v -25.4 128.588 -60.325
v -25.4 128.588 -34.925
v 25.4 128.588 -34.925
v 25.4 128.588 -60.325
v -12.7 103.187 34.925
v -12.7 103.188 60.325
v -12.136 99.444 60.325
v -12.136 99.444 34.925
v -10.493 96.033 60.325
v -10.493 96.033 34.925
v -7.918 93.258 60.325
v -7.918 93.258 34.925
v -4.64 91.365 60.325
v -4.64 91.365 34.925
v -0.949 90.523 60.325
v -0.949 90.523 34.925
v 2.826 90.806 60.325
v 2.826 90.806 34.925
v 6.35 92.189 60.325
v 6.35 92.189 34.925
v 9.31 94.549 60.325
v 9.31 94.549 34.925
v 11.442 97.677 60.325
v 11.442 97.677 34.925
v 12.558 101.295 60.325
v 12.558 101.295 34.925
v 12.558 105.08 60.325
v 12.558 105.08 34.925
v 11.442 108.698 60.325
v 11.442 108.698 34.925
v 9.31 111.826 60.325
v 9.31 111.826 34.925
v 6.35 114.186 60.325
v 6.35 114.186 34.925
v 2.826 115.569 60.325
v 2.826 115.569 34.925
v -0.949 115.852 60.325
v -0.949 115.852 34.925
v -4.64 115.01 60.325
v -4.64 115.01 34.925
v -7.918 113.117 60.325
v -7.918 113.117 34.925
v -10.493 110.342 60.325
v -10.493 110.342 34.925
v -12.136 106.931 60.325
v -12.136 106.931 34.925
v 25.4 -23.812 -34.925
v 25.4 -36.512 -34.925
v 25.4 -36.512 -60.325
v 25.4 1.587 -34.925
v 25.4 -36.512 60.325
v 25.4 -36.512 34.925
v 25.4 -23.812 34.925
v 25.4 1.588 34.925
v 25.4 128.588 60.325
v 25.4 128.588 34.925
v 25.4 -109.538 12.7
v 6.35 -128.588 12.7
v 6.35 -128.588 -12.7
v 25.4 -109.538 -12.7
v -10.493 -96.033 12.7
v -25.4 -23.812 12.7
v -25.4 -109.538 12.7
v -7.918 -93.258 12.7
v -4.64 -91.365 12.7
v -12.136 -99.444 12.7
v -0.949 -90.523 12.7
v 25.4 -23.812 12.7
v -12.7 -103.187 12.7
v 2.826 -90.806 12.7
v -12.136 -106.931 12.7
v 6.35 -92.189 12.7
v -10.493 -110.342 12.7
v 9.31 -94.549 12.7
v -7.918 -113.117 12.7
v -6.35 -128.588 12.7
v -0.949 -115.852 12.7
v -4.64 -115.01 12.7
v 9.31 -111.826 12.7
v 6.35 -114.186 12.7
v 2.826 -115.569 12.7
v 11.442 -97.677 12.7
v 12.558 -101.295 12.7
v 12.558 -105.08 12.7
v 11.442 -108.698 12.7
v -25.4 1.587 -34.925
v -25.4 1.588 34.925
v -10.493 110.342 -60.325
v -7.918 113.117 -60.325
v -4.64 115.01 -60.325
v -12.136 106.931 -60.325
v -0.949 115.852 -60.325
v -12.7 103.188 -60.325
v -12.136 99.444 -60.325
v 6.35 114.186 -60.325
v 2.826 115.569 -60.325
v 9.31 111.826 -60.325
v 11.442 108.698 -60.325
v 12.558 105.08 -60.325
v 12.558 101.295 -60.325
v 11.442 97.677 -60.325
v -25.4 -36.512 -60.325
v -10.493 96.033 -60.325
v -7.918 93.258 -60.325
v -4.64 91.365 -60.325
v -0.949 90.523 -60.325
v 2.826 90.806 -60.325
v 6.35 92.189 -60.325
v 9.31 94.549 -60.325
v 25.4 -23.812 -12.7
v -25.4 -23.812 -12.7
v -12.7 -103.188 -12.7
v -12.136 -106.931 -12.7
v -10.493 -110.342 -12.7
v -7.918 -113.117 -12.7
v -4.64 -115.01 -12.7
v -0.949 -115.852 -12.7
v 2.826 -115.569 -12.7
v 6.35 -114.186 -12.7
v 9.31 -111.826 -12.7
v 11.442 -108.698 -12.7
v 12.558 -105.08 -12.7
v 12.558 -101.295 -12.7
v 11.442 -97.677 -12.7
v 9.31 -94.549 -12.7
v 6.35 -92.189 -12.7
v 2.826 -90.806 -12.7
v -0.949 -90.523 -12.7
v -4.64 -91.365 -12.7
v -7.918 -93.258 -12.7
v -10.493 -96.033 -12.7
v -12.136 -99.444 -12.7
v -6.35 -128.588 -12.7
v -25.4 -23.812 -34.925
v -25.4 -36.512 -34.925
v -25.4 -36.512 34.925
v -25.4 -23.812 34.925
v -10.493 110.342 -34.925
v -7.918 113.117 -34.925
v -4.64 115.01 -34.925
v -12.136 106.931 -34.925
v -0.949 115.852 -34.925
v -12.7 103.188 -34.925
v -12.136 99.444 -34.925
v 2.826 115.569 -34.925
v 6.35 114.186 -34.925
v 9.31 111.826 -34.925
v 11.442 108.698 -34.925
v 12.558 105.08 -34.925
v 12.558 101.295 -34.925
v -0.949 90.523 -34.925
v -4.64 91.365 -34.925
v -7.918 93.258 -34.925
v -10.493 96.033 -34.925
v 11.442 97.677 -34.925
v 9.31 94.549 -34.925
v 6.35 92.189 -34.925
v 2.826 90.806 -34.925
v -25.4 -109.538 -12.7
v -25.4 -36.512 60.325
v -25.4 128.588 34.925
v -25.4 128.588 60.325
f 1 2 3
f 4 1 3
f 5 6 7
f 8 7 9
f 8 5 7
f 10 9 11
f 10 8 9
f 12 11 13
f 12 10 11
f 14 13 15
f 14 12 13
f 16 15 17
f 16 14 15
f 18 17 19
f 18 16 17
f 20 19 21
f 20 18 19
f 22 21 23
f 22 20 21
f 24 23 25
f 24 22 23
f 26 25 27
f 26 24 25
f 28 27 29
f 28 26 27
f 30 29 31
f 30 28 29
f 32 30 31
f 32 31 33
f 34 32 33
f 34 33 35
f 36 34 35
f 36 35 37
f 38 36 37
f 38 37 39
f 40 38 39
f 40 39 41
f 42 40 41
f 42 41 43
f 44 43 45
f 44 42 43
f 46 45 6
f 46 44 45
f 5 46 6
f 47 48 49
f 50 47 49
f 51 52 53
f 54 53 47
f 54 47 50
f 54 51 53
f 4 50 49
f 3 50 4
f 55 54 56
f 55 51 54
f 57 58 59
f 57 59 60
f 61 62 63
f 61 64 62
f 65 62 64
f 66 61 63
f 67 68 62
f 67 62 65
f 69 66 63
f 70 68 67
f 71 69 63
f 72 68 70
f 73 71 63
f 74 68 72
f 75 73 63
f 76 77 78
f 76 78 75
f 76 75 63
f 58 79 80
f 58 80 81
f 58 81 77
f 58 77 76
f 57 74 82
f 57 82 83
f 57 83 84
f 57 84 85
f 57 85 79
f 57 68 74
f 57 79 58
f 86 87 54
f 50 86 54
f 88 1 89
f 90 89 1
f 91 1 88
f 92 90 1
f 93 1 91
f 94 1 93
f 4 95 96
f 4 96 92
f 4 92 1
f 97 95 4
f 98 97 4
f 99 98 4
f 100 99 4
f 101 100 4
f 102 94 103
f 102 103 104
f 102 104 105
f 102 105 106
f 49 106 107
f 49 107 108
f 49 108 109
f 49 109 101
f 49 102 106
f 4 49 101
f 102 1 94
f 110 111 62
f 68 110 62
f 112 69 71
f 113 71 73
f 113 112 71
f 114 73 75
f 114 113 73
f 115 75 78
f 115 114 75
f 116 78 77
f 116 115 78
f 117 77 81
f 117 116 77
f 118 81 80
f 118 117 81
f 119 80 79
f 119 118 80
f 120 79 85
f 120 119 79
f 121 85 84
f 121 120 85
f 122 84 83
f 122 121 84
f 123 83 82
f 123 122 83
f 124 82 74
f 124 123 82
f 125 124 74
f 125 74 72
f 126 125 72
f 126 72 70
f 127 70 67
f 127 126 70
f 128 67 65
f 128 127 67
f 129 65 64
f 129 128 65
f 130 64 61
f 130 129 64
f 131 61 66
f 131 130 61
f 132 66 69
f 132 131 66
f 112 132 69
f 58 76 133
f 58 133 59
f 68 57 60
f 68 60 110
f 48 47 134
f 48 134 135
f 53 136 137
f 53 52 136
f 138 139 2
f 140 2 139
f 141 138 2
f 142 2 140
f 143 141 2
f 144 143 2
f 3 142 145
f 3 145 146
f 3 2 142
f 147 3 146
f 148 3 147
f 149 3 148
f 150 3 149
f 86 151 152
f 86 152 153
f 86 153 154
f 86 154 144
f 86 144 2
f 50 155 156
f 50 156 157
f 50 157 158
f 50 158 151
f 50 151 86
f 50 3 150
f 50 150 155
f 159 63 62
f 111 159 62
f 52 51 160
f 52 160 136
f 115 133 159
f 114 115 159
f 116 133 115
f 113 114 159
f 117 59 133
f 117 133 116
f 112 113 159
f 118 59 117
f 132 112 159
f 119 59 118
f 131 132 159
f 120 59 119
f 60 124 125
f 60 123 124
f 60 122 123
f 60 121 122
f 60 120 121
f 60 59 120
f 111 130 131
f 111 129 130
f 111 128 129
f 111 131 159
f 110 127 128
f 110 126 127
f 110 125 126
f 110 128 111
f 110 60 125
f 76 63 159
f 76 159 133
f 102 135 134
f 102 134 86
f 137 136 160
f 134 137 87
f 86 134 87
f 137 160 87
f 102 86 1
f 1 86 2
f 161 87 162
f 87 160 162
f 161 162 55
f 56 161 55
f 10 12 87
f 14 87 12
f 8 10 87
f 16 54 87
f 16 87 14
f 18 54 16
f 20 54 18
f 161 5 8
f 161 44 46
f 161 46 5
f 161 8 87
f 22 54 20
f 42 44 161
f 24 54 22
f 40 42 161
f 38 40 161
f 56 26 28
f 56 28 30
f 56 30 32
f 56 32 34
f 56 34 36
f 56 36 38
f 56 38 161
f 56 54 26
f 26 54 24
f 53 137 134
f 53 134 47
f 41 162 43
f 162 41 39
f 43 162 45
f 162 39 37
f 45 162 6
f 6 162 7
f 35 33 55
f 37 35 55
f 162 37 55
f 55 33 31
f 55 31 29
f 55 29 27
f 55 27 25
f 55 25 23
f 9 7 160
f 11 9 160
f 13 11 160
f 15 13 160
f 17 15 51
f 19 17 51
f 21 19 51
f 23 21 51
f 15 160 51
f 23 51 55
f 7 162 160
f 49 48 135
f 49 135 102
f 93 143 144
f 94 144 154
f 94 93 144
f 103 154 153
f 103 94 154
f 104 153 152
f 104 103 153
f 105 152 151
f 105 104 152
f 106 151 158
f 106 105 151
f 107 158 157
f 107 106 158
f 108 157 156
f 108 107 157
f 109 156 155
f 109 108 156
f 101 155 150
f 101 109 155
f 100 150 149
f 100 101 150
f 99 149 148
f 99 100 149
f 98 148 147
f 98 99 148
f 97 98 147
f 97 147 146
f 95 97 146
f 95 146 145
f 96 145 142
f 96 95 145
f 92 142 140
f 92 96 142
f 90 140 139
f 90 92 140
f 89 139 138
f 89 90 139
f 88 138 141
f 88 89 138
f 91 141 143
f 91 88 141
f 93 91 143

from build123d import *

# Parameters (mm, degrees)
SKETCH1_W                      = 50.8
SKETCH1_H                      = 257.175
SKETCH1_R                      = 12.7
EXTRUDE1_DEPTH                 = 60.325
CUT_EXTRUDE1_DEPTH             = 179.146927159
CUT_EXTRUDE2_REACH             = 146.288
CUT_EXTRUDE2_DIRECTION_2_REACH = 146.288
SKETCH4_W                      = 50.8
SKETCH4_H                      = 120.65
EXTRUDE2_DEPTH                 = 25.4


with BuildPart() as part:
    # Sketch1 → Extrude1 (new, symmetric)
    with BuildSketch(Plane.XY):
        Rectangle(SKETCH1_W, SKETCH1_H)
        with Locations(Location((0, 103.1875, 0), (0, 0, 180))):
            Circle(SKETCH1_R, mode=Mode.SUBTRACT)
        with Locations(Location((0, -103.1875, 0), (0, 0, 180))):
            Circle(SKETCH1_R, mode=Mode.SUBTRACT)
    extrude(amount=EXTRUDE1_DEPTH, both=True)

    # Sketch2 → Cut-Extrude1 (cut, through all)
    with BuildSketch(Plane.XY.offset(60.325)):
        Polygon((-25.4, -109.5375), (-6.35, -128.5875), (-25.4, -128.5875), align=None)
        Polygon((25.4, -109.5375), (25.4, -128.5875), (6.35, -128.5875), align=None)
    extrude(amount=-CUT_EXTRUDE1_DEPTH, mode=Mode.SUBTRACT)

    # Sketch3 → Cut-Extrude2 (cut, up to next)
    with BuildSketch(Plane(origin=(0, 0, 0), x_dir=(0, 0, -1), z_dir=(1, 0, 0)), mode=Mode.PRIVATE) as cut_extrude2_sk1:
        Polygon((-34.925, 128.5875), (34.925, 128.5875), (34.925, -36.5125), (60.325, -36.5125), (60.325, -128.5875), (12.7, -128.5875), (12.7, -23.8125), (-12.7, -23.8125), (-12.7, -128.5875), (-60.325, -128.5875), (-60.325, -36.5125), (-34.925, -36.5125), align=None)
    cut_extrude2_tool1 = extrude(cut_extrude2_sk1.sketch, amount=-CUT_EXTRUDE2_REACH, mode=Mode.PRIVATE) & part.part
    add(cut_extrude2_tool1.solids().sort_by_distance((0, -9.175782, 0))[0], mode=Mode.SUBTRACT)

    # Sketch3 → Cut-Extrude2 direction 2 (cut, up to next)
    with BuildSketch(Plane(origin=(0, 0, 0), x_dir=(0, 0, -1), z_dir=(1, 0, 0)), mode=Mode.PRIVATE) as cut_extrude2_direction_2_sk1:
        Polygon((-34.925, 128.5875), (34.925, 128.5875), (34.925, -36.5125), (60.325, -36.5125), (60.325, -128.5875), (12.7, -128.5875), (12.7, -23.8125), (-12.7, -23.8125), (-12.7, -128.5875), (-60.325, -128.5875), (-60.325, -36.5125), (-34.925, -36.5125), align=None)
    cut_extrude2_direction_2_tool1 = extrude(cut_extrude2_direction_2_sk1.sketch, amount=CUT_EXTRUDE2_DIRECTION_2_REACH, mode=Mode.PRIVATE) & part.part
    add(cut_extrude2_direction_2_tool1.solids().sort_by_distance((0, -9.175782, 0))[0], mode=Mode.SUBTRACT)


with BuildPart() as cut_extrude2_piece_1:
    # of the separate pieces the step leaves, piece 1, a body of its own (cut_extrude2_pieces)
    add(part.part.solids().sort_by_distance((-25.4, 128.5875, -60.325))[0])



with BuildPart() as cut_extrude2_piece_2:
    # of the separate pieces the step leaves, piece 2, a body of its own (cut_extrude2_pieces)
    add(part.part.solids().sort_by_distance((-25.4, 128.5875, 34.925))[0])


with BuildPart() as cut_extrude2_piece_3:
    # of the separate pieces the step leaves, piece 3, a body of its own (cut_extrude2_pieces)
    add(part.part.solids().sort_by_distance((-25.4, -109.5375, 12.7))[0])


with BuildPart() as cut_extrude2_piece_1_1:
    add(cut_extrude2_piece_1.part)

    add(cut_extrude2_piece_2.part)  # Extrude2 merges Cut-Extrude2 piece 2
    # Sketch4 → Extrude2 (add)
    with BuildSketch(Plane.XZ.offset(23.8125)):
        Rectangle(SKETCH4_W, SKETCH4_H)
    extrude(amount=-EXTRUDE2_DEPTH)


solid = Compound([cut_extrude2_piece_3.part, cut_extrude2_piece_1_1.part])
